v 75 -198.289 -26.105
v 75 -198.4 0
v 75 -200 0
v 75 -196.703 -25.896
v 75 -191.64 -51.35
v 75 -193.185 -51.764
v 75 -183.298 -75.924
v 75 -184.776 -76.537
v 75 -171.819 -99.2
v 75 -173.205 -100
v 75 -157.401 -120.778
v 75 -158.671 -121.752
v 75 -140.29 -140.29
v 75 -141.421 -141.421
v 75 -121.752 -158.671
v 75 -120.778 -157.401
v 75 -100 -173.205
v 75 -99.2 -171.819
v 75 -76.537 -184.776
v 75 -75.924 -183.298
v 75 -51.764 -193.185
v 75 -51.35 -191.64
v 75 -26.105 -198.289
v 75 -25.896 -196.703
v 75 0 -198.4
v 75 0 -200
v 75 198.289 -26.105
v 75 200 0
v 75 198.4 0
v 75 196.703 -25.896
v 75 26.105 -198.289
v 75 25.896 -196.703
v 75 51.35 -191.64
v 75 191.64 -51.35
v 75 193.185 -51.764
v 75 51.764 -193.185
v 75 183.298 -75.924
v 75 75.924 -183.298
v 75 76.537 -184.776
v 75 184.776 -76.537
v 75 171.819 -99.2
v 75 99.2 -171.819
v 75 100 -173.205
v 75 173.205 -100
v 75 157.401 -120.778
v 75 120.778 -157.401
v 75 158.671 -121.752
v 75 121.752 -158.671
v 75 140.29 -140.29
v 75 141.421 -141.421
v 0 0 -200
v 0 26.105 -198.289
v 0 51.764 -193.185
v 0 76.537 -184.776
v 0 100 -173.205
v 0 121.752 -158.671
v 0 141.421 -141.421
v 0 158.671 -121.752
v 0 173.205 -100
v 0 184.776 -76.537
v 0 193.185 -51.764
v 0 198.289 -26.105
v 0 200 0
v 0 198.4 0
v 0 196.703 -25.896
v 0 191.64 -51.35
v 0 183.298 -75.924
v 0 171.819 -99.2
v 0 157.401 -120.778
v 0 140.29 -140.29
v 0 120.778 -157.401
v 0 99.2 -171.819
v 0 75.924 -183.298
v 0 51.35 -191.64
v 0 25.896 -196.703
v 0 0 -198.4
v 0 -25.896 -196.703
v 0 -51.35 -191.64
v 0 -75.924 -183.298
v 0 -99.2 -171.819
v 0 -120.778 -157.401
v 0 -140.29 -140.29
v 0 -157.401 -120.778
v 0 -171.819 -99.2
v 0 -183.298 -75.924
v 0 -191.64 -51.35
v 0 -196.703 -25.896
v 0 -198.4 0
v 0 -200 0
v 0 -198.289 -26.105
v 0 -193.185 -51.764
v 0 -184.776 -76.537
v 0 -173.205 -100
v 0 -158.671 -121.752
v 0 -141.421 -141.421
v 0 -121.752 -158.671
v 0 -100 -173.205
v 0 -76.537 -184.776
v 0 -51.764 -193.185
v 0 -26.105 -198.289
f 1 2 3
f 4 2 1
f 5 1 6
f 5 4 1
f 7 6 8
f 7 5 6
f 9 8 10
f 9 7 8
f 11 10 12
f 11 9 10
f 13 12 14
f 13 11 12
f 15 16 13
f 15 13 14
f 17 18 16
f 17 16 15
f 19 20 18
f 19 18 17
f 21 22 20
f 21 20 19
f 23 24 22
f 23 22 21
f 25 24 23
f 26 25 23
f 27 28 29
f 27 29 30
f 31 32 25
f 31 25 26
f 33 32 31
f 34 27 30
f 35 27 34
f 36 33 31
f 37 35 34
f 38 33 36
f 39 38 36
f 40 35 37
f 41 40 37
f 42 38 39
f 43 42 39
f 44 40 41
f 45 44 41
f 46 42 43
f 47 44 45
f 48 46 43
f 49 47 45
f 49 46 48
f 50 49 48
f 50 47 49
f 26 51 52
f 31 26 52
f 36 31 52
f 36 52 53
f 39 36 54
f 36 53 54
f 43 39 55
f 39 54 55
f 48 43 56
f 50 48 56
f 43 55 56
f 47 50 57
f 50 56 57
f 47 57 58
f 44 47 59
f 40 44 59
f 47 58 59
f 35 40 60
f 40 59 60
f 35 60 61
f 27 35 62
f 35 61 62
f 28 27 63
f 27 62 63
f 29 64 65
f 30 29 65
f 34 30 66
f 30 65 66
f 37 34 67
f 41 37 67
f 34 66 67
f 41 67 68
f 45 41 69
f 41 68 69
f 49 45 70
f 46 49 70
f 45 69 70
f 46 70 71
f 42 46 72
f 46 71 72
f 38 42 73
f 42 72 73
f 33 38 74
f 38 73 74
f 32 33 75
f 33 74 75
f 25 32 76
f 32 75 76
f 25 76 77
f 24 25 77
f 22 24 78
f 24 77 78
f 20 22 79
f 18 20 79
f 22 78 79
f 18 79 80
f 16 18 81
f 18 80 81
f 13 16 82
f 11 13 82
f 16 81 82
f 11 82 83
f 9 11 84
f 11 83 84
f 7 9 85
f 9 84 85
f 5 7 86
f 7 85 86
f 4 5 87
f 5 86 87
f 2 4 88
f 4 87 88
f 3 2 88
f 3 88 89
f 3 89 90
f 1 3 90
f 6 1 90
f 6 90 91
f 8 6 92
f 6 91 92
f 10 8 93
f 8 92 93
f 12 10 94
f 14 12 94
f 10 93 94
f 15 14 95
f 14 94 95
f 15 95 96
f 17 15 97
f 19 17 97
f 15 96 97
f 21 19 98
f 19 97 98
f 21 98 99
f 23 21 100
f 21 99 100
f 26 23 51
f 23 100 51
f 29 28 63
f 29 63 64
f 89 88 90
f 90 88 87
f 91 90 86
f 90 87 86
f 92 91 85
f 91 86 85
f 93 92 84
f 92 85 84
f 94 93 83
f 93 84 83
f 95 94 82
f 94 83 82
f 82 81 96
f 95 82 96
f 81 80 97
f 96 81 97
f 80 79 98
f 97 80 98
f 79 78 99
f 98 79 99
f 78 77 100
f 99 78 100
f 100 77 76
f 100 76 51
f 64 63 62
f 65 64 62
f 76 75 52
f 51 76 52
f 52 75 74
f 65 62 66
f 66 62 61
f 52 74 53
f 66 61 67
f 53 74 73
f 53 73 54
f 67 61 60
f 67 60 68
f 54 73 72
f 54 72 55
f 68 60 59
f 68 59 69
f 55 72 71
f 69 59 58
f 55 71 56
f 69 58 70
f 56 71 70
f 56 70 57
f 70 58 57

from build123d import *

# Parameters (mm, degrees)
BOSS_EXTRUDE1_DEPTH = 75


with BuildPart() as part:
    # Sketch1 → Boss-Extrude1 (new body)
    with BuildSketch(Plane(origin=(0, 0, 0), x_dir=(0, 0, -1), z_dir=(1, 0, 0))):
        with BuildLine():
            ThreePointArc((200, 0), (141.421356237, 141.421356237), (0, 200))
            Line((0, 200), (0, 198.4))
            ThreePointArc((0, 198.4), (140.289985387, 140.289985387), (198.4, 0))
            ThreePointArc((198.4, 0), (140.289985387, -140.289985387), (0, -198.4))
            Line((0, -198.4), (0, -200))
            ThreePointArc((0, -200), (141.421356237, -141.421356237), (200, 0))
        make_face()
    extrude(amount=BOSS_EXTRUDE1_DEPTH)


solid = part.part
